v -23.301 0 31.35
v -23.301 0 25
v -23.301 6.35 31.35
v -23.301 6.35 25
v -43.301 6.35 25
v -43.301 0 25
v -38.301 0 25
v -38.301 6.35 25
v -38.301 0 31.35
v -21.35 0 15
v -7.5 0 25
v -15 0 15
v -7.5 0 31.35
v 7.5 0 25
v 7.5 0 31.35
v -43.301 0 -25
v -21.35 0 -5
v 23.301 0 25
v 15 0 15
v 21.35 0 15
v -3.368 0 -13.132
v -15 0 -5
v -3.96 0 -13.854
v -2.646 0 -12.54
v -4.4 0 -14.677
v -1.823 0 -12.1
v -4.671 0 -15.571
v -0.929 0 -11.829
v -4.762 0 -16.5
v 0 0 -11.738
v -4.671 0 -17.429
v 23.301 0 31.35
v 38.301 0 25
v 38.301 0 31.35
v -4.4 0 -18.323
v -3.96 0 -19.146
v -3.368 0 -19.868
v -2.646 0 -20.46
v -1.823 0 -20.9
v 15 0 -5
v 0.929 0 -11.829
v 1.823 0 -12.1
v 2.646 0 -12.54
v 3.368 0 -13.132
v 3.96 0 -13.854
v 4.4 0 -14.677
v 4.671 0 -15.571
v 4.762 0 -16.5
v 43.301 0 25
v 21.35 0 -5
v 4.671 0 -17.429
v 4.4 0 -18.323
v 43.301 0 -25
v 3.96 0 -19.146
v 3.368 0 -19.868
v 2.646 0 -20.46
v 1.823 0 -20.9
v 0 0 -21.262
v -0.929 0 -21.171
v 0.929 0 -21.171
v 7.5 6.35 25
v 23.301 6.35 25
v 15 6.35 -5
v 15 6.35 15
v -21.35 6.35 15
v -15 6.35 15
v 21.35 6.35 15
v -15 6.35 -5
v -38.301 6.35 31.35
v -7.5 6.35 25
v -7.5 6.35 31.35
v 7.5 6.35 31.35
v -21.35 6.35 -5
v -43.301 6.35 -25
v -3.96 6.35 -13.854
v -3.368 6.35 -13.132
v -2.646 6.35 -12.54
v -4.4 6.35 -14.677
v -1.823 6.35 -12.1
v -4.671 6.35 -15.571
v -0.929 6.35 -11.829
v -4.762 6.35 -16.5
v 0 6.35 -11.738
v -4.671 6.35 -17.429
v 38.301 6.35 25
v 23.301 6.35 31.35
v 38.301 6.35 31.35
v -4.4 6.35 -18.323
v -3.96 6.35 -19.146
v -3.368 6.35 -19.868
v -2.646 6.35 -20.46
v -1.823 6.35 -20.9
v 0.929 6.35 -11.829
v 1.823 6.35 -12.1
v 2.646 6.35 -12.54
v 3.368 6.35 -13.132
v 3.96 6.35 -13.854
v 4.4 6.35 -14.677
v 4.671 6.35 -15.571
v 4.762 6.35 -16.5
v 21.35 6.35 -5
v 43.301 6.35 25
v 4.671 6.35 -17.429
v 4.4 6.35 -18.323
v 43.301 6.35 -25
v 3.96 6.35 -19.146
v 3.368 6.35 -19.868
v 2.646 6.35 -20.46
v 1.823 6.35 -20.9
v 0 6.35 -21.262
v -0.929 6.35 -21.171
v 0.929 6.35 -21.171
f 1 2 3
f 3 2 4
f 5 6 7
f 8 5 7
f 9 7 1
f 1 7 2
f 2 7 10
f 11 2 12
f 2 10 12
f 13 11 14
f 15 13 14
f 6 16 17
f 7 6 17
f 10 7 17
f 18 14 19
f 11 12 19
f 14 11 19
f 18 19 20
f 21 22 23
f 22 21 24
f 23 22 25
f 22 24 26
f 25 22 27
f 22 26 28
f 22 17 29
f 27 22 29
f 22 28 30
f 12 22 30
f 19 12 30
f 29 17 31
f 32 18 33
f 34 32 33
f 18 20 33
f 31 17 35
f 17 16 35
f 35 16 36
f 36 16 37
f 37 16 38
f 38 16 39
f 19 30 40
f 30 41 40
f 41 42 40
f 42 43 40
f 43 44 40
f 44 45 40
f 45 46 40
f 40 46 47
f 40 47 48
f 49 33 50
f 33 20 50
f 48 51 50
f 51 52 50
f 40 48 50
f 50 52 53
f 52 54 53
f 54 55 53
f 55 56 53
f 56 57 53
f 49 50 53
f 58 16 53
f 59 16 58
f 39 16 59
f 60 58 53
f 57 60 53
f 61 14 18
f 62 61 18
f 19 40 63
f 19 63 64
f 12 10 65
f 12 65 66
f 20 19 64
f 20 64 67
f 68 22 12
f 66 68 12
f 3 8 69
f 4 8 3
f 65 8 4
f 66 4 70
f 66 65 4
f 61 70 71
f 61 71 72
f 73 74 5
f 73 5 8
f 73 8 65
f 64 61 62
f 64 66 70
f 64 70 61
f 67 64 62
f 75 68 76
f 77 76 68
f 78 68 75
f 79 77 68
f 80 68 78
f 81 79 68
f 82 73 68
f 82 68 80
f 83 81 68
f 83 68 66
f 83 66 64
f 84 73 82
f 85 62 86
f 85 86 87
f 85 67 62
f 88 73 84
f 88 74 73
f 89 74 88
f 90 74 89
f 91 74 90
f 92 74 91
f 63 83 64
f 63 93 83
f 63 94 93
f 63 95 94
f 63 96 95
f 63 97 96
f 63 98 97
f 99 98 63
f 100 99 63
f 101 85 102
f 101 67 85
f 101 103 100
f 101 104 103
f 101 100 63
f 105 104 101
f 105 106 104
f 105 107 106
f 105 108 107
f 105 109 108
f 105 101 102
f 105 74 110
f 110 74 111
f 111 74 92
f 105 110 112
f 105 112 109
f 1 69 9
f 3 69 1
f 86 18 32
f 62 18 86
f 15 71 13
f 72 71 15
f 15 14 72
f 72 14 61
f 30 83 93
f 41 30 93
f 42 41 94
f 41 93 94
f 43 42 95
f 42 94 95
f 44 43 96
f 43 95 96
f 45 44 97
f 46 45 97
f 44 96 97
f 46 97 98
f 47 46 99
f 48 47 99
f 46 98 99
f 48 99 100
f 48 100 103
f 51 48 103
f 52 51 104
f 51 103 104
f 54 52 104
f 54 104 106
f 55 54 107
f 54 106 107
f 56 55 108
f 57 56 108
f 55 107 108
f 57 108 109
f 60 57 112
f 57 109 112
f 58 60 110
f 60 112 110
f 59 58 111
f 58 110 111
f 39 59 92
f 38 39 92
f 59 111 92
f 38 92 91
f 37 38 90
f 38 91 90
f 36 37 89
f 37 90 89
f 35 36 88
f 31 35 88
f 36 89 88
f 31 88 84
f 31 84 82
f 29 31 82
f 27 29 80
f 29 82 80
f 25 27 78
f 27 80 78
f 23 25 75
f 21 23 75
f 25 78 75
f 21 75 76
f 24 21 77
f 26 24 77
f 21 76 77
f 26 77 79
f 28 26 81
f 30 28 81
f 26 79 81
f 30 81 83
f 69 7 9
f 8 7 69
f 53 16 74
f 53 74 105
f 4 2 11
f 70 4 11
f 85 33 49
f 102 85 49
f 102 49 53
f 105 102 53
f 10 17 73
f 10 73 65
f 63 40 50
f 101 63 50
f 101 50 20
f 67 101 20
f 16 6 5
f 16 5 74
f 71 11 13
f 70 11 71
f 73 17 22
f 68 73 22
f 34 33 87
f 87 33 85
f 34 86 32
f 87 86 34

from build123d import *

# Parameters (mm, degrees)
ESQUISSE2_W             = 86.602540378
ESQUISSE2_H             = 50
BOSS_EXTRU_1_DEPTH      = 6.35
SKETCH1_R               = 4.7625
CUT_EXTRUDE1_DEPTH      = 6.35
ESQUISSE3_W             = 15
ESQUISSE3_H             = 6.35
BOSS_EXTRU_2_DEPTH      = 6.35
ESQUISSE4_W             = 6.35
ESQUISSE4_H             = 20
ENL_V_MAT_EXTRU_1_DEPTH = 6.35


with BuildPart() as part:
    # Esquisse2 → Boss.-Extru.1 (new body)
    with BuildSketch(Plane(origin=(0, 0, 0), x_dir=(1, 0, 0), z_dir=(0, 1, 0))):
        Rectangle(ESQUISSE2_W, ESQUISSE2_H)
    extrude(amount=BOSS_EXTRU_1_DEPTH)

    # Sketch1 → Cut-Extrude1 (cut)
    with BuildSketch(Plane(origin=(0, 6.35, 0), x_dir=(1, 0, 0), z_dir=(0, 1, 0))):
        with Locations(Location((0, 16.5, 0), (0, 0, 270))):
            Circle(SKETCH1_R)
    extrude(amount=-CUT_EXTRUDE1_DEPTH, mode=Mode.SUBTRACT)

    # Esquisse3 → Boss.-Extru.2 (add)
    with BuildSketch(Plane.XY.offset(25)):
        with Locations((30.801270189, 3.175)):
            Rectangle(ESQUISSE3_W, ESQUISSE3_H)
        with Locations((-30.801270189, 3.175)):
            Rectangle(ESQUISSE3_W, ESQUISSE3_H)
        with Locations((0, 3.175)):
            Rectangle(ESQUISSE3_W, ESQUISSE3_H)
    extrude(amount=BOSS_EXTRU_2_DEPTH)

    # Esquisse4 → Enlèv. mat.-Extru.1 (cut)
    with BuildSketch(Plane.XZ):
        with Locations((18.175, 5)):
            Rectangle(ESQUISSE4_W, ESQUISSE4_H)
        with Locations((-18.175, 5)):
            Rectangle(ESQUISSE4_W, ESQUISSE4_H)
    extrude(amount=-ENL_V_MAT_EXTRU_1_DEPTH, mode=Mode.SUBTRACT)


solid = part.part
